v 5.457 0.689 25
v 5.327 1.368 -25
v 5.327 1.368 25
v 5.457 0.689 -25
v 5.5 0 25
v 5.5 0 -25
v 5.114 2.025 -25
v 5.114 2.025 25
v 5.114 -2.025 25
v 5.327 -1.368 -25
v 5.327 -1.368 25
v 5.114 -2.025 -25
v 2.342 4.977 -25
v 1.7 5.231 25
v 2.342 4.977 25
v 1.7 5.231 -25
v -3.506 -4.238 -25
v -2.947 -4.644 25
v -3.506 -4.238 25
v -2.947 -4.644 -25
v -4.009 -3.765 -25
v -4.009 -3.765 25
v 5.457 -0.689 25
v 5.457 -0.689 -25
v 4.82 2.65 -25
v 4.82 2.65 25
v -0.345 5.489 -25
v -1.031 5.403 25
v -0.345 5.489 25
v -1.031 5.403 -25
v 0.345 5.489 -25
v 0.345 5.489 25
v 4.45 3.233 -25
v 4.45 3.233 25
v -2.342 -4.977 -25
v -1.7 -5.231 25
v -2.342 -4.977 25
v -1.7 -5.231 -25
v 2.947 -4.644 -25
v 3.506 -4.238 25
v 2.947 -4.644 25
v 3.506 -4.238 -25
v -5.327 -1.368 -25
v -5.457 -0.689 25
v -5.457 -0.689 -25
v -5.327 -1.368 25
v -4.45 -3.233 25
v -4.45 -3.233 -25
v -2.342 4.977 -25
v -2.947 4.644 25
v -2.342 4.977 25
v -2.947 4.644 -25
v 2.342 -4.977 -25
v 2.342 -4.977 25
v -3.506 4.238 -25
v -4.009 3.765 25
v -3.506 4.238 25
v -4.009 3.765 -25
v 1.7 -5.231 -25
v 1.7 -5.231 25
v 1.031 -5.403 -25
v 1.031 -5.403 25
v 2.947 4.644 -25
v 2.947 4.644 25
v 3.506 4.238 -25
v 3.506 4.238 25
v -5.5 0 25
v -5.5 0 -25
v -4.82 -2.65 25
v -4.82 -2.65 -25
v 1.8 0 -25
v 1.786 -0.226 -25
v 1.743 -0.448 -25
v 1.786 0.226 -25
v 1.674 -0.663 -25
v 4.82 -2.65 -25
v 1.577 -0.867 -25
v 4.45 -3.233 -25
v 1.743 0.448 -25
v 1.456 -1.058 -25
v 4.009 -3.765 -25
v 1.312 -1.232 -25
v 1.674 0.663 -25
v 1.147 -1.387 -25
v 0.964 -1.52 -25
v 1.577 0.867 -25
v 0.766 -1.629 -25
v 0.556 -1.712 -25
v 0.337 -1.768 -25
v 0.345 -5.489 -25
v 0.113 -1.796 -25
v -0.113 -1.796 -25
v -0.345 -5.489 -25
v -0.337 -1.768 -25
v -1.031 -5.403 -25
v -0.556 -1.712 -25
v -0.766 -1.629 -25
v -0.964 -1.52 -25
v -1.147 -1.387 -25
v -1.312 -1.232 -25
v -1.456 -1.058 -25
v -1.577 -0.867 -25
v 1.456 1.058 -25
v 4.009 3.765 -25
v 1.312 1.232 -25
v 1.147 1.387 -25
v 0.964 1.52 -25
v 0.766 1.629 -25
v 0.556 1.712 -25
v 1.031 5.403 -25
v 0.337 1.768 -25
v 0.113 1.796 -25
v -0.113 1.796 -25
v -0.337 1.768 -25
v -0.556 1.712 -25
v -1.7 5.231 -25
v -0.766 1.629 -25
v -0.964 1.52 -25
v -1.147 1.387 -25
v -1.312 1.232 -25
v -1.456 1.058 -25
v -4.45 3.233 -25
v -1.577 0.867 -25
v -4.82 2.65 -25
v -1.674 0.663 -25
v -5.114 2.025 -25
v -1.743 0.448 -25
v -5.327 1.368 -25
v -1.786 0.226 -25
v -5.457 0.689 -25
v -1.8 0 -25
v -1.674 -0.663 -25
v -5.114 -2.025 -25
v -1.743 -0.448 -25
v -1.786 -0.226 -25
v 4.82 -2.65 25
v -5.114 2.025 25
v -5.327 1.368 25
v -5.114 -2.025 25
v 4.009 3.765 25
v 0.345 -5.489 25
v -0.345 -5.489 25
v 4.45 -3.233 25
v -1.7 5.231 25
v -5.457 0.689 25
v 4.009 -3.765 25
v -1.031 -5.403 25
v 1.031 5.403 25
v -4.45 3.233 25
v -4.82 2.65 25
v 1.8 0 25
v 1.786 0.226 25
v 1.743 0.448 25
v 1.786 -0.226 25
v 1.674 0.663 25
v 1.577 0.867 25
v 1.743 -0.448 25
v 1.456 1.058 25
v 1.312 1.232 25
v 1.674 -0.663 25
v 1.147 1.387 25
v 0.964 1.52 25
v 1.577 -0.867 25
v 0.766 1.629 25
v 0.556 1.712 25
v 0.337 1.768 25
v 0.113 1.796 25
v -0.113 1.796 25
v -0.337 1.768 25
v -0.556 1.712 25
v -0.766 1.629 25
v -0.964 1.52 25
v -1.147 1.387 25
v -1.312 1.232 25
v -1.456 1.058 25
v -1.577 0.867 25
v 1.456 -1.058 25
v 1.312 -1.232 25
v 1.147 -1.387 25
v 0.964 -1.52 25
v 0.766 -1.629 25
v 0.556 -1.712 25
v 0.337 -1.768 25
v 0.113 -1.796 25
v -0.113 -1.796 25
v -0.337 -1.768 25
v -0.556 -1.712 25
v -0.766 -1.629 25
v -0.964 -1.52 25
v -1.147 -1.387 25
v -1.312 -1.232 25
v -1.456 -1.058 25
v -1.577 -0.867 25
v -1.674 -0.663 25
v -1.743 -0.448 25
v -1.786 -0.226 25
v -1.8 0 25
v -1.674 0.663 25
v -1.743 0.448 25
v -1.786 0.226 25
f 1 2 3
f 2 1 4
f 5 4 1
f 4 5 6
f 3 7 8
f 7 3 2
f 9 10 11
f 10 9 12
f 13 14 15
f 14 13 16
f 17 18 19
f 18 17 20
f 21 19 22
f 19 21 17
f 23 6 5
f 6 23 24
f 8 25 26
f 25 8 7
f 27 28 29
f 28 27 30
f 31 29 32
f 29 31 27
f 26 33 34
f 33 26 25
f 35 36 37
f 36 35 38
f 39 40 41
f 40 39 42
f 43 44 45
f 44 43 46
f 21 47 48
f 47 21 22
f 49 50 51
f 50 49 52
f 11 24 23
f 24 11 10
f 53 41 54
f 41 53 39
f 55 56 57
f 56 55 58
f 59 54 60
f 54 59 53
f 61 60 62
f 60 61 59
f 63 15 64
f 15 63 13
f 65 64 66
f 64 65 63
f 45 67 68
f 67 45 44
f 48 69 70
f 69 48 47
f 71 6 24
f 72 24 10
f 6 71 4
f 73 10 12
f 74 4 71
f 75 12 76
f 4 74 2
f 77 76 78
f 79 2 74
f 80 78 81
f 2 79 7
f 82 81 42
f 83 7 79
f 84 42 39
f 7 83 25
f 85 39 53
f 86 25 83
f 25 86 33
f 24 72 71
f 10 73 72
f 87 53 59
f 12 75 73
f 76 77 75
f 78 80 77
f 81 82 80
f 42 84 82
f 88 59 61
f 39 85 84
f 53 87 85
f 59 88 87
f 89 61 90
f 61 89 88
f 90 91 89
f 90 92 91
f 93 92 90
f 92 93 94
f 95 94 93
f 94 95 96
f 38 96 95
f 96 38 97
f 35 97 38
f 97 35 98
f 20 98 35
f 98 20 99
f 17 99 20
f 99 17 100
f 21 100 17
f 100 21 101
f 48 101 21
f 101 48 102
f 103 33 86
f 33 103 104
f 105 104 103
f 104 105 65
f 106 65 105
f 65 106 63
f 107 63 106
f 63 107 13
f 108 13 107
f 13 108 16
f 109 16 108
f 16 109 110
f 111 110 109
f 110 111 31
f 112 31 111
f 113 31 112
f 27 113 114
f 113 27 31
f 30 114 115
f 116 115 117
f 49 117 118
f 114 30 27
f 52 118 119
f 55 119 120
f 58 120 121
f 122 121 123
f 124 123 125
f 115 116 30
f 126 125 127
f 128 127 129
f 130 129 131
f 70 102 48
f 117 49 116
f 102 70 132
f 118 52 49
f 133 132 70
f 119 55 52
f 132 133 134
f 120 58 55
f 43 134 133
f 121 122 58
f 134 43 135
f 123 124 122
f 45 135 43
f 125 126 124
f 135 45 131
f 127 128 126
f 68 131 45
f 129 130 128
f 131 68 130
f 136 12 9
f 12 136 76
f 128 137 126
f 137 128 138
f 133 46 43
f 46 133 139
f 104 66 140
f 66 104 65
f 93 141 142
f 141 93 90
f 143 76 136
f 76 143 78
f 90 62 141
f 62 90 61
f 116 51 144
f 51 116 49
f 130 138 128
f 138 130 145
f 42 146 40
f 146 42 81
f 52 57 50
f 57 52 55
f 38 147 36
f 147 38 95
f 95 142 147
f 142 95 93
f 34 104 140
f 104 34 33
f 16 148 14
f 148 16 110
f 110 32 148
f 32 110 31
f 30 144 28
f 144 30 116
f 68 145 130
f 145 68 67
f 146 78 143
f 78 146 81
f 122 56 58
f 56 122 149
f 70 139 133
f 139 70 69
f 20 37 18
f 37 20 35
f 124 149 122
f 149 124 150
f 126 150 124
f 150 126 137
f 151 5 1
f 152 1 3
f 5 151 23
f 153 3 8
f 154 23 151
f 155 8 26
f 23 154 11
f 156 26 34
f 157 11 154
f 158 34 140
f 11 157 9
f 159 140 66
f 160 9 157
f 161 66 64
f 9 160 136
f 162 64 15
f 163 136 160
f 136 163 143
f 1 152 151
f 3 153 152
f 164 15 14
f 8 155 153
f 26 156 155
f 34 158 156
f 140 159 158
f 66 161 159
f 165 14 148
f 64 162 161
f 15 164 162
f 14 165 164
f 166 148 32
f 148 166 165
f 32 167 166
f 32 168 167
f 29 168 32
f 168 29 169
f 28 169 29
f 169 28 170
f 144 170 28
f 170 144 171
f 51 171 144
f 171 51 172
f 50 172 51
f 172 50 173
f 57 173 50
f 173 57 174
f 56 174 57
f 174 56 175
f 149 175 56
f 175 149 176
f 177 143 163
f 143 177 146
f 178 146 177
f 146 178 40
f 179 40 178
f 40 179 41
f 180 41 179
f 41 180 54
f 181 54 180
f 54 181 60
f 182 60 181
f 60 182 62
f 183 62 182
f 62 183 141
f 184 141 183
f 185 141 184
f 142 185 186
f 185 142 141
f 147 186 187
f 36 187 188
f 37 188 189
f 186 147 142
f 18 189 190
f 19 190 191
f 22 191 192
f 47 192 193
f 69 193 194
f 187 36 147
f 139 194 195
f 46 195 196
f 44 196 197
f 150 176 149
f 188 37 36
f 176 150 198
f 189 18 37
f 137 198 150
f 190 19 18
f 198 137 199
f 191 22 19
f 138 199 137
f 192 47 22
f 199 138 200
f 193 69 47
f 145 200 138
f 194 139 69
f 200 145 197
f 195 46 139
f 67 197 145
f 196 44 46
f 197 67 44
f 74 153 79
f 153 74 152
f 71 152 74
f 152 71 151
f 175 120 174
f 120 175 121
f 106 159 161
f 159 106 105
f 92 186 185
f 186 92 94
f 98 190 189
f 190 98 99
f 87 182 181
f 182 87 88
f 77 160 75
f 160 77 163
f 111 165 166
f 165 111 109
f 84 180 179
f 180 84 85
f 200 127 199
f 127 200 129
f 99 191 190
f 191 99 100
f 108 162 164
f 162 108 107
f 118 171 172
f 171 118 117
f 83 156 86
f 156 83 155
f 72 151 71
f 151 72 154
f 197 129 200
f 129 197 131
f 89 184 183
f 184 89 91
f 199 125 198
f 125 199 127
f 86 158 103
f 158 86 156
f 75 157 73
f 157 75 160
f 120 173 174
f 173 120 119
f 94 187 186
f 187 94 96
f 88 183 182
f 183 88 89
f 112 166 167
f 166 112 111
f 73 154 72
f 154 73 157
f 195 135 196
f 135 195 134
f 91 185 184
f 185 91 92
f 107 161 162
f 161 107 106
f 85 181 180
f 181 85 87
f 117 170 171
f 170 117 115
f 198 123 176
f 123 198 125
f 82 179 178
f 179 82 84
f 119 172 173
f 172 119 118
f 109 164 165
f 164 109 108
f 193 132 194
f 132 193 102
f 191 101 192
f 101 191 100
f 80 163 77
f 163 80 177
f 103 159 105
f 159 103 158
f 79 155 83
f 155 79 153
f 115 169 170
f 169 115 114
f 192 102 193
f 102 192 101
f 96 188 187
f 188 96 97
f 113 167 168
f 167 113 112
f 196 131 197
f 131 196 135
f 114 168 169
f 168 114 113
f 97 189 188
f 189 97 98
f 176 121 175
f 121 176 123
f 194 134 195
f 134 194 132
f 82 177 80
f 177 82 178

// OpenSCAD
$fn = 50;


difference() {
	union() {
		translate(v = [0, 0, -25.0000000000]) {
			cylinder(h = 50, r = 5.5000000000);
		}
	}
	union() {
		#translate(v = [0, 0, -100.0000000000]) {
			cylinder(h = 200, r = 1.8000000000);
		}
	}
}
